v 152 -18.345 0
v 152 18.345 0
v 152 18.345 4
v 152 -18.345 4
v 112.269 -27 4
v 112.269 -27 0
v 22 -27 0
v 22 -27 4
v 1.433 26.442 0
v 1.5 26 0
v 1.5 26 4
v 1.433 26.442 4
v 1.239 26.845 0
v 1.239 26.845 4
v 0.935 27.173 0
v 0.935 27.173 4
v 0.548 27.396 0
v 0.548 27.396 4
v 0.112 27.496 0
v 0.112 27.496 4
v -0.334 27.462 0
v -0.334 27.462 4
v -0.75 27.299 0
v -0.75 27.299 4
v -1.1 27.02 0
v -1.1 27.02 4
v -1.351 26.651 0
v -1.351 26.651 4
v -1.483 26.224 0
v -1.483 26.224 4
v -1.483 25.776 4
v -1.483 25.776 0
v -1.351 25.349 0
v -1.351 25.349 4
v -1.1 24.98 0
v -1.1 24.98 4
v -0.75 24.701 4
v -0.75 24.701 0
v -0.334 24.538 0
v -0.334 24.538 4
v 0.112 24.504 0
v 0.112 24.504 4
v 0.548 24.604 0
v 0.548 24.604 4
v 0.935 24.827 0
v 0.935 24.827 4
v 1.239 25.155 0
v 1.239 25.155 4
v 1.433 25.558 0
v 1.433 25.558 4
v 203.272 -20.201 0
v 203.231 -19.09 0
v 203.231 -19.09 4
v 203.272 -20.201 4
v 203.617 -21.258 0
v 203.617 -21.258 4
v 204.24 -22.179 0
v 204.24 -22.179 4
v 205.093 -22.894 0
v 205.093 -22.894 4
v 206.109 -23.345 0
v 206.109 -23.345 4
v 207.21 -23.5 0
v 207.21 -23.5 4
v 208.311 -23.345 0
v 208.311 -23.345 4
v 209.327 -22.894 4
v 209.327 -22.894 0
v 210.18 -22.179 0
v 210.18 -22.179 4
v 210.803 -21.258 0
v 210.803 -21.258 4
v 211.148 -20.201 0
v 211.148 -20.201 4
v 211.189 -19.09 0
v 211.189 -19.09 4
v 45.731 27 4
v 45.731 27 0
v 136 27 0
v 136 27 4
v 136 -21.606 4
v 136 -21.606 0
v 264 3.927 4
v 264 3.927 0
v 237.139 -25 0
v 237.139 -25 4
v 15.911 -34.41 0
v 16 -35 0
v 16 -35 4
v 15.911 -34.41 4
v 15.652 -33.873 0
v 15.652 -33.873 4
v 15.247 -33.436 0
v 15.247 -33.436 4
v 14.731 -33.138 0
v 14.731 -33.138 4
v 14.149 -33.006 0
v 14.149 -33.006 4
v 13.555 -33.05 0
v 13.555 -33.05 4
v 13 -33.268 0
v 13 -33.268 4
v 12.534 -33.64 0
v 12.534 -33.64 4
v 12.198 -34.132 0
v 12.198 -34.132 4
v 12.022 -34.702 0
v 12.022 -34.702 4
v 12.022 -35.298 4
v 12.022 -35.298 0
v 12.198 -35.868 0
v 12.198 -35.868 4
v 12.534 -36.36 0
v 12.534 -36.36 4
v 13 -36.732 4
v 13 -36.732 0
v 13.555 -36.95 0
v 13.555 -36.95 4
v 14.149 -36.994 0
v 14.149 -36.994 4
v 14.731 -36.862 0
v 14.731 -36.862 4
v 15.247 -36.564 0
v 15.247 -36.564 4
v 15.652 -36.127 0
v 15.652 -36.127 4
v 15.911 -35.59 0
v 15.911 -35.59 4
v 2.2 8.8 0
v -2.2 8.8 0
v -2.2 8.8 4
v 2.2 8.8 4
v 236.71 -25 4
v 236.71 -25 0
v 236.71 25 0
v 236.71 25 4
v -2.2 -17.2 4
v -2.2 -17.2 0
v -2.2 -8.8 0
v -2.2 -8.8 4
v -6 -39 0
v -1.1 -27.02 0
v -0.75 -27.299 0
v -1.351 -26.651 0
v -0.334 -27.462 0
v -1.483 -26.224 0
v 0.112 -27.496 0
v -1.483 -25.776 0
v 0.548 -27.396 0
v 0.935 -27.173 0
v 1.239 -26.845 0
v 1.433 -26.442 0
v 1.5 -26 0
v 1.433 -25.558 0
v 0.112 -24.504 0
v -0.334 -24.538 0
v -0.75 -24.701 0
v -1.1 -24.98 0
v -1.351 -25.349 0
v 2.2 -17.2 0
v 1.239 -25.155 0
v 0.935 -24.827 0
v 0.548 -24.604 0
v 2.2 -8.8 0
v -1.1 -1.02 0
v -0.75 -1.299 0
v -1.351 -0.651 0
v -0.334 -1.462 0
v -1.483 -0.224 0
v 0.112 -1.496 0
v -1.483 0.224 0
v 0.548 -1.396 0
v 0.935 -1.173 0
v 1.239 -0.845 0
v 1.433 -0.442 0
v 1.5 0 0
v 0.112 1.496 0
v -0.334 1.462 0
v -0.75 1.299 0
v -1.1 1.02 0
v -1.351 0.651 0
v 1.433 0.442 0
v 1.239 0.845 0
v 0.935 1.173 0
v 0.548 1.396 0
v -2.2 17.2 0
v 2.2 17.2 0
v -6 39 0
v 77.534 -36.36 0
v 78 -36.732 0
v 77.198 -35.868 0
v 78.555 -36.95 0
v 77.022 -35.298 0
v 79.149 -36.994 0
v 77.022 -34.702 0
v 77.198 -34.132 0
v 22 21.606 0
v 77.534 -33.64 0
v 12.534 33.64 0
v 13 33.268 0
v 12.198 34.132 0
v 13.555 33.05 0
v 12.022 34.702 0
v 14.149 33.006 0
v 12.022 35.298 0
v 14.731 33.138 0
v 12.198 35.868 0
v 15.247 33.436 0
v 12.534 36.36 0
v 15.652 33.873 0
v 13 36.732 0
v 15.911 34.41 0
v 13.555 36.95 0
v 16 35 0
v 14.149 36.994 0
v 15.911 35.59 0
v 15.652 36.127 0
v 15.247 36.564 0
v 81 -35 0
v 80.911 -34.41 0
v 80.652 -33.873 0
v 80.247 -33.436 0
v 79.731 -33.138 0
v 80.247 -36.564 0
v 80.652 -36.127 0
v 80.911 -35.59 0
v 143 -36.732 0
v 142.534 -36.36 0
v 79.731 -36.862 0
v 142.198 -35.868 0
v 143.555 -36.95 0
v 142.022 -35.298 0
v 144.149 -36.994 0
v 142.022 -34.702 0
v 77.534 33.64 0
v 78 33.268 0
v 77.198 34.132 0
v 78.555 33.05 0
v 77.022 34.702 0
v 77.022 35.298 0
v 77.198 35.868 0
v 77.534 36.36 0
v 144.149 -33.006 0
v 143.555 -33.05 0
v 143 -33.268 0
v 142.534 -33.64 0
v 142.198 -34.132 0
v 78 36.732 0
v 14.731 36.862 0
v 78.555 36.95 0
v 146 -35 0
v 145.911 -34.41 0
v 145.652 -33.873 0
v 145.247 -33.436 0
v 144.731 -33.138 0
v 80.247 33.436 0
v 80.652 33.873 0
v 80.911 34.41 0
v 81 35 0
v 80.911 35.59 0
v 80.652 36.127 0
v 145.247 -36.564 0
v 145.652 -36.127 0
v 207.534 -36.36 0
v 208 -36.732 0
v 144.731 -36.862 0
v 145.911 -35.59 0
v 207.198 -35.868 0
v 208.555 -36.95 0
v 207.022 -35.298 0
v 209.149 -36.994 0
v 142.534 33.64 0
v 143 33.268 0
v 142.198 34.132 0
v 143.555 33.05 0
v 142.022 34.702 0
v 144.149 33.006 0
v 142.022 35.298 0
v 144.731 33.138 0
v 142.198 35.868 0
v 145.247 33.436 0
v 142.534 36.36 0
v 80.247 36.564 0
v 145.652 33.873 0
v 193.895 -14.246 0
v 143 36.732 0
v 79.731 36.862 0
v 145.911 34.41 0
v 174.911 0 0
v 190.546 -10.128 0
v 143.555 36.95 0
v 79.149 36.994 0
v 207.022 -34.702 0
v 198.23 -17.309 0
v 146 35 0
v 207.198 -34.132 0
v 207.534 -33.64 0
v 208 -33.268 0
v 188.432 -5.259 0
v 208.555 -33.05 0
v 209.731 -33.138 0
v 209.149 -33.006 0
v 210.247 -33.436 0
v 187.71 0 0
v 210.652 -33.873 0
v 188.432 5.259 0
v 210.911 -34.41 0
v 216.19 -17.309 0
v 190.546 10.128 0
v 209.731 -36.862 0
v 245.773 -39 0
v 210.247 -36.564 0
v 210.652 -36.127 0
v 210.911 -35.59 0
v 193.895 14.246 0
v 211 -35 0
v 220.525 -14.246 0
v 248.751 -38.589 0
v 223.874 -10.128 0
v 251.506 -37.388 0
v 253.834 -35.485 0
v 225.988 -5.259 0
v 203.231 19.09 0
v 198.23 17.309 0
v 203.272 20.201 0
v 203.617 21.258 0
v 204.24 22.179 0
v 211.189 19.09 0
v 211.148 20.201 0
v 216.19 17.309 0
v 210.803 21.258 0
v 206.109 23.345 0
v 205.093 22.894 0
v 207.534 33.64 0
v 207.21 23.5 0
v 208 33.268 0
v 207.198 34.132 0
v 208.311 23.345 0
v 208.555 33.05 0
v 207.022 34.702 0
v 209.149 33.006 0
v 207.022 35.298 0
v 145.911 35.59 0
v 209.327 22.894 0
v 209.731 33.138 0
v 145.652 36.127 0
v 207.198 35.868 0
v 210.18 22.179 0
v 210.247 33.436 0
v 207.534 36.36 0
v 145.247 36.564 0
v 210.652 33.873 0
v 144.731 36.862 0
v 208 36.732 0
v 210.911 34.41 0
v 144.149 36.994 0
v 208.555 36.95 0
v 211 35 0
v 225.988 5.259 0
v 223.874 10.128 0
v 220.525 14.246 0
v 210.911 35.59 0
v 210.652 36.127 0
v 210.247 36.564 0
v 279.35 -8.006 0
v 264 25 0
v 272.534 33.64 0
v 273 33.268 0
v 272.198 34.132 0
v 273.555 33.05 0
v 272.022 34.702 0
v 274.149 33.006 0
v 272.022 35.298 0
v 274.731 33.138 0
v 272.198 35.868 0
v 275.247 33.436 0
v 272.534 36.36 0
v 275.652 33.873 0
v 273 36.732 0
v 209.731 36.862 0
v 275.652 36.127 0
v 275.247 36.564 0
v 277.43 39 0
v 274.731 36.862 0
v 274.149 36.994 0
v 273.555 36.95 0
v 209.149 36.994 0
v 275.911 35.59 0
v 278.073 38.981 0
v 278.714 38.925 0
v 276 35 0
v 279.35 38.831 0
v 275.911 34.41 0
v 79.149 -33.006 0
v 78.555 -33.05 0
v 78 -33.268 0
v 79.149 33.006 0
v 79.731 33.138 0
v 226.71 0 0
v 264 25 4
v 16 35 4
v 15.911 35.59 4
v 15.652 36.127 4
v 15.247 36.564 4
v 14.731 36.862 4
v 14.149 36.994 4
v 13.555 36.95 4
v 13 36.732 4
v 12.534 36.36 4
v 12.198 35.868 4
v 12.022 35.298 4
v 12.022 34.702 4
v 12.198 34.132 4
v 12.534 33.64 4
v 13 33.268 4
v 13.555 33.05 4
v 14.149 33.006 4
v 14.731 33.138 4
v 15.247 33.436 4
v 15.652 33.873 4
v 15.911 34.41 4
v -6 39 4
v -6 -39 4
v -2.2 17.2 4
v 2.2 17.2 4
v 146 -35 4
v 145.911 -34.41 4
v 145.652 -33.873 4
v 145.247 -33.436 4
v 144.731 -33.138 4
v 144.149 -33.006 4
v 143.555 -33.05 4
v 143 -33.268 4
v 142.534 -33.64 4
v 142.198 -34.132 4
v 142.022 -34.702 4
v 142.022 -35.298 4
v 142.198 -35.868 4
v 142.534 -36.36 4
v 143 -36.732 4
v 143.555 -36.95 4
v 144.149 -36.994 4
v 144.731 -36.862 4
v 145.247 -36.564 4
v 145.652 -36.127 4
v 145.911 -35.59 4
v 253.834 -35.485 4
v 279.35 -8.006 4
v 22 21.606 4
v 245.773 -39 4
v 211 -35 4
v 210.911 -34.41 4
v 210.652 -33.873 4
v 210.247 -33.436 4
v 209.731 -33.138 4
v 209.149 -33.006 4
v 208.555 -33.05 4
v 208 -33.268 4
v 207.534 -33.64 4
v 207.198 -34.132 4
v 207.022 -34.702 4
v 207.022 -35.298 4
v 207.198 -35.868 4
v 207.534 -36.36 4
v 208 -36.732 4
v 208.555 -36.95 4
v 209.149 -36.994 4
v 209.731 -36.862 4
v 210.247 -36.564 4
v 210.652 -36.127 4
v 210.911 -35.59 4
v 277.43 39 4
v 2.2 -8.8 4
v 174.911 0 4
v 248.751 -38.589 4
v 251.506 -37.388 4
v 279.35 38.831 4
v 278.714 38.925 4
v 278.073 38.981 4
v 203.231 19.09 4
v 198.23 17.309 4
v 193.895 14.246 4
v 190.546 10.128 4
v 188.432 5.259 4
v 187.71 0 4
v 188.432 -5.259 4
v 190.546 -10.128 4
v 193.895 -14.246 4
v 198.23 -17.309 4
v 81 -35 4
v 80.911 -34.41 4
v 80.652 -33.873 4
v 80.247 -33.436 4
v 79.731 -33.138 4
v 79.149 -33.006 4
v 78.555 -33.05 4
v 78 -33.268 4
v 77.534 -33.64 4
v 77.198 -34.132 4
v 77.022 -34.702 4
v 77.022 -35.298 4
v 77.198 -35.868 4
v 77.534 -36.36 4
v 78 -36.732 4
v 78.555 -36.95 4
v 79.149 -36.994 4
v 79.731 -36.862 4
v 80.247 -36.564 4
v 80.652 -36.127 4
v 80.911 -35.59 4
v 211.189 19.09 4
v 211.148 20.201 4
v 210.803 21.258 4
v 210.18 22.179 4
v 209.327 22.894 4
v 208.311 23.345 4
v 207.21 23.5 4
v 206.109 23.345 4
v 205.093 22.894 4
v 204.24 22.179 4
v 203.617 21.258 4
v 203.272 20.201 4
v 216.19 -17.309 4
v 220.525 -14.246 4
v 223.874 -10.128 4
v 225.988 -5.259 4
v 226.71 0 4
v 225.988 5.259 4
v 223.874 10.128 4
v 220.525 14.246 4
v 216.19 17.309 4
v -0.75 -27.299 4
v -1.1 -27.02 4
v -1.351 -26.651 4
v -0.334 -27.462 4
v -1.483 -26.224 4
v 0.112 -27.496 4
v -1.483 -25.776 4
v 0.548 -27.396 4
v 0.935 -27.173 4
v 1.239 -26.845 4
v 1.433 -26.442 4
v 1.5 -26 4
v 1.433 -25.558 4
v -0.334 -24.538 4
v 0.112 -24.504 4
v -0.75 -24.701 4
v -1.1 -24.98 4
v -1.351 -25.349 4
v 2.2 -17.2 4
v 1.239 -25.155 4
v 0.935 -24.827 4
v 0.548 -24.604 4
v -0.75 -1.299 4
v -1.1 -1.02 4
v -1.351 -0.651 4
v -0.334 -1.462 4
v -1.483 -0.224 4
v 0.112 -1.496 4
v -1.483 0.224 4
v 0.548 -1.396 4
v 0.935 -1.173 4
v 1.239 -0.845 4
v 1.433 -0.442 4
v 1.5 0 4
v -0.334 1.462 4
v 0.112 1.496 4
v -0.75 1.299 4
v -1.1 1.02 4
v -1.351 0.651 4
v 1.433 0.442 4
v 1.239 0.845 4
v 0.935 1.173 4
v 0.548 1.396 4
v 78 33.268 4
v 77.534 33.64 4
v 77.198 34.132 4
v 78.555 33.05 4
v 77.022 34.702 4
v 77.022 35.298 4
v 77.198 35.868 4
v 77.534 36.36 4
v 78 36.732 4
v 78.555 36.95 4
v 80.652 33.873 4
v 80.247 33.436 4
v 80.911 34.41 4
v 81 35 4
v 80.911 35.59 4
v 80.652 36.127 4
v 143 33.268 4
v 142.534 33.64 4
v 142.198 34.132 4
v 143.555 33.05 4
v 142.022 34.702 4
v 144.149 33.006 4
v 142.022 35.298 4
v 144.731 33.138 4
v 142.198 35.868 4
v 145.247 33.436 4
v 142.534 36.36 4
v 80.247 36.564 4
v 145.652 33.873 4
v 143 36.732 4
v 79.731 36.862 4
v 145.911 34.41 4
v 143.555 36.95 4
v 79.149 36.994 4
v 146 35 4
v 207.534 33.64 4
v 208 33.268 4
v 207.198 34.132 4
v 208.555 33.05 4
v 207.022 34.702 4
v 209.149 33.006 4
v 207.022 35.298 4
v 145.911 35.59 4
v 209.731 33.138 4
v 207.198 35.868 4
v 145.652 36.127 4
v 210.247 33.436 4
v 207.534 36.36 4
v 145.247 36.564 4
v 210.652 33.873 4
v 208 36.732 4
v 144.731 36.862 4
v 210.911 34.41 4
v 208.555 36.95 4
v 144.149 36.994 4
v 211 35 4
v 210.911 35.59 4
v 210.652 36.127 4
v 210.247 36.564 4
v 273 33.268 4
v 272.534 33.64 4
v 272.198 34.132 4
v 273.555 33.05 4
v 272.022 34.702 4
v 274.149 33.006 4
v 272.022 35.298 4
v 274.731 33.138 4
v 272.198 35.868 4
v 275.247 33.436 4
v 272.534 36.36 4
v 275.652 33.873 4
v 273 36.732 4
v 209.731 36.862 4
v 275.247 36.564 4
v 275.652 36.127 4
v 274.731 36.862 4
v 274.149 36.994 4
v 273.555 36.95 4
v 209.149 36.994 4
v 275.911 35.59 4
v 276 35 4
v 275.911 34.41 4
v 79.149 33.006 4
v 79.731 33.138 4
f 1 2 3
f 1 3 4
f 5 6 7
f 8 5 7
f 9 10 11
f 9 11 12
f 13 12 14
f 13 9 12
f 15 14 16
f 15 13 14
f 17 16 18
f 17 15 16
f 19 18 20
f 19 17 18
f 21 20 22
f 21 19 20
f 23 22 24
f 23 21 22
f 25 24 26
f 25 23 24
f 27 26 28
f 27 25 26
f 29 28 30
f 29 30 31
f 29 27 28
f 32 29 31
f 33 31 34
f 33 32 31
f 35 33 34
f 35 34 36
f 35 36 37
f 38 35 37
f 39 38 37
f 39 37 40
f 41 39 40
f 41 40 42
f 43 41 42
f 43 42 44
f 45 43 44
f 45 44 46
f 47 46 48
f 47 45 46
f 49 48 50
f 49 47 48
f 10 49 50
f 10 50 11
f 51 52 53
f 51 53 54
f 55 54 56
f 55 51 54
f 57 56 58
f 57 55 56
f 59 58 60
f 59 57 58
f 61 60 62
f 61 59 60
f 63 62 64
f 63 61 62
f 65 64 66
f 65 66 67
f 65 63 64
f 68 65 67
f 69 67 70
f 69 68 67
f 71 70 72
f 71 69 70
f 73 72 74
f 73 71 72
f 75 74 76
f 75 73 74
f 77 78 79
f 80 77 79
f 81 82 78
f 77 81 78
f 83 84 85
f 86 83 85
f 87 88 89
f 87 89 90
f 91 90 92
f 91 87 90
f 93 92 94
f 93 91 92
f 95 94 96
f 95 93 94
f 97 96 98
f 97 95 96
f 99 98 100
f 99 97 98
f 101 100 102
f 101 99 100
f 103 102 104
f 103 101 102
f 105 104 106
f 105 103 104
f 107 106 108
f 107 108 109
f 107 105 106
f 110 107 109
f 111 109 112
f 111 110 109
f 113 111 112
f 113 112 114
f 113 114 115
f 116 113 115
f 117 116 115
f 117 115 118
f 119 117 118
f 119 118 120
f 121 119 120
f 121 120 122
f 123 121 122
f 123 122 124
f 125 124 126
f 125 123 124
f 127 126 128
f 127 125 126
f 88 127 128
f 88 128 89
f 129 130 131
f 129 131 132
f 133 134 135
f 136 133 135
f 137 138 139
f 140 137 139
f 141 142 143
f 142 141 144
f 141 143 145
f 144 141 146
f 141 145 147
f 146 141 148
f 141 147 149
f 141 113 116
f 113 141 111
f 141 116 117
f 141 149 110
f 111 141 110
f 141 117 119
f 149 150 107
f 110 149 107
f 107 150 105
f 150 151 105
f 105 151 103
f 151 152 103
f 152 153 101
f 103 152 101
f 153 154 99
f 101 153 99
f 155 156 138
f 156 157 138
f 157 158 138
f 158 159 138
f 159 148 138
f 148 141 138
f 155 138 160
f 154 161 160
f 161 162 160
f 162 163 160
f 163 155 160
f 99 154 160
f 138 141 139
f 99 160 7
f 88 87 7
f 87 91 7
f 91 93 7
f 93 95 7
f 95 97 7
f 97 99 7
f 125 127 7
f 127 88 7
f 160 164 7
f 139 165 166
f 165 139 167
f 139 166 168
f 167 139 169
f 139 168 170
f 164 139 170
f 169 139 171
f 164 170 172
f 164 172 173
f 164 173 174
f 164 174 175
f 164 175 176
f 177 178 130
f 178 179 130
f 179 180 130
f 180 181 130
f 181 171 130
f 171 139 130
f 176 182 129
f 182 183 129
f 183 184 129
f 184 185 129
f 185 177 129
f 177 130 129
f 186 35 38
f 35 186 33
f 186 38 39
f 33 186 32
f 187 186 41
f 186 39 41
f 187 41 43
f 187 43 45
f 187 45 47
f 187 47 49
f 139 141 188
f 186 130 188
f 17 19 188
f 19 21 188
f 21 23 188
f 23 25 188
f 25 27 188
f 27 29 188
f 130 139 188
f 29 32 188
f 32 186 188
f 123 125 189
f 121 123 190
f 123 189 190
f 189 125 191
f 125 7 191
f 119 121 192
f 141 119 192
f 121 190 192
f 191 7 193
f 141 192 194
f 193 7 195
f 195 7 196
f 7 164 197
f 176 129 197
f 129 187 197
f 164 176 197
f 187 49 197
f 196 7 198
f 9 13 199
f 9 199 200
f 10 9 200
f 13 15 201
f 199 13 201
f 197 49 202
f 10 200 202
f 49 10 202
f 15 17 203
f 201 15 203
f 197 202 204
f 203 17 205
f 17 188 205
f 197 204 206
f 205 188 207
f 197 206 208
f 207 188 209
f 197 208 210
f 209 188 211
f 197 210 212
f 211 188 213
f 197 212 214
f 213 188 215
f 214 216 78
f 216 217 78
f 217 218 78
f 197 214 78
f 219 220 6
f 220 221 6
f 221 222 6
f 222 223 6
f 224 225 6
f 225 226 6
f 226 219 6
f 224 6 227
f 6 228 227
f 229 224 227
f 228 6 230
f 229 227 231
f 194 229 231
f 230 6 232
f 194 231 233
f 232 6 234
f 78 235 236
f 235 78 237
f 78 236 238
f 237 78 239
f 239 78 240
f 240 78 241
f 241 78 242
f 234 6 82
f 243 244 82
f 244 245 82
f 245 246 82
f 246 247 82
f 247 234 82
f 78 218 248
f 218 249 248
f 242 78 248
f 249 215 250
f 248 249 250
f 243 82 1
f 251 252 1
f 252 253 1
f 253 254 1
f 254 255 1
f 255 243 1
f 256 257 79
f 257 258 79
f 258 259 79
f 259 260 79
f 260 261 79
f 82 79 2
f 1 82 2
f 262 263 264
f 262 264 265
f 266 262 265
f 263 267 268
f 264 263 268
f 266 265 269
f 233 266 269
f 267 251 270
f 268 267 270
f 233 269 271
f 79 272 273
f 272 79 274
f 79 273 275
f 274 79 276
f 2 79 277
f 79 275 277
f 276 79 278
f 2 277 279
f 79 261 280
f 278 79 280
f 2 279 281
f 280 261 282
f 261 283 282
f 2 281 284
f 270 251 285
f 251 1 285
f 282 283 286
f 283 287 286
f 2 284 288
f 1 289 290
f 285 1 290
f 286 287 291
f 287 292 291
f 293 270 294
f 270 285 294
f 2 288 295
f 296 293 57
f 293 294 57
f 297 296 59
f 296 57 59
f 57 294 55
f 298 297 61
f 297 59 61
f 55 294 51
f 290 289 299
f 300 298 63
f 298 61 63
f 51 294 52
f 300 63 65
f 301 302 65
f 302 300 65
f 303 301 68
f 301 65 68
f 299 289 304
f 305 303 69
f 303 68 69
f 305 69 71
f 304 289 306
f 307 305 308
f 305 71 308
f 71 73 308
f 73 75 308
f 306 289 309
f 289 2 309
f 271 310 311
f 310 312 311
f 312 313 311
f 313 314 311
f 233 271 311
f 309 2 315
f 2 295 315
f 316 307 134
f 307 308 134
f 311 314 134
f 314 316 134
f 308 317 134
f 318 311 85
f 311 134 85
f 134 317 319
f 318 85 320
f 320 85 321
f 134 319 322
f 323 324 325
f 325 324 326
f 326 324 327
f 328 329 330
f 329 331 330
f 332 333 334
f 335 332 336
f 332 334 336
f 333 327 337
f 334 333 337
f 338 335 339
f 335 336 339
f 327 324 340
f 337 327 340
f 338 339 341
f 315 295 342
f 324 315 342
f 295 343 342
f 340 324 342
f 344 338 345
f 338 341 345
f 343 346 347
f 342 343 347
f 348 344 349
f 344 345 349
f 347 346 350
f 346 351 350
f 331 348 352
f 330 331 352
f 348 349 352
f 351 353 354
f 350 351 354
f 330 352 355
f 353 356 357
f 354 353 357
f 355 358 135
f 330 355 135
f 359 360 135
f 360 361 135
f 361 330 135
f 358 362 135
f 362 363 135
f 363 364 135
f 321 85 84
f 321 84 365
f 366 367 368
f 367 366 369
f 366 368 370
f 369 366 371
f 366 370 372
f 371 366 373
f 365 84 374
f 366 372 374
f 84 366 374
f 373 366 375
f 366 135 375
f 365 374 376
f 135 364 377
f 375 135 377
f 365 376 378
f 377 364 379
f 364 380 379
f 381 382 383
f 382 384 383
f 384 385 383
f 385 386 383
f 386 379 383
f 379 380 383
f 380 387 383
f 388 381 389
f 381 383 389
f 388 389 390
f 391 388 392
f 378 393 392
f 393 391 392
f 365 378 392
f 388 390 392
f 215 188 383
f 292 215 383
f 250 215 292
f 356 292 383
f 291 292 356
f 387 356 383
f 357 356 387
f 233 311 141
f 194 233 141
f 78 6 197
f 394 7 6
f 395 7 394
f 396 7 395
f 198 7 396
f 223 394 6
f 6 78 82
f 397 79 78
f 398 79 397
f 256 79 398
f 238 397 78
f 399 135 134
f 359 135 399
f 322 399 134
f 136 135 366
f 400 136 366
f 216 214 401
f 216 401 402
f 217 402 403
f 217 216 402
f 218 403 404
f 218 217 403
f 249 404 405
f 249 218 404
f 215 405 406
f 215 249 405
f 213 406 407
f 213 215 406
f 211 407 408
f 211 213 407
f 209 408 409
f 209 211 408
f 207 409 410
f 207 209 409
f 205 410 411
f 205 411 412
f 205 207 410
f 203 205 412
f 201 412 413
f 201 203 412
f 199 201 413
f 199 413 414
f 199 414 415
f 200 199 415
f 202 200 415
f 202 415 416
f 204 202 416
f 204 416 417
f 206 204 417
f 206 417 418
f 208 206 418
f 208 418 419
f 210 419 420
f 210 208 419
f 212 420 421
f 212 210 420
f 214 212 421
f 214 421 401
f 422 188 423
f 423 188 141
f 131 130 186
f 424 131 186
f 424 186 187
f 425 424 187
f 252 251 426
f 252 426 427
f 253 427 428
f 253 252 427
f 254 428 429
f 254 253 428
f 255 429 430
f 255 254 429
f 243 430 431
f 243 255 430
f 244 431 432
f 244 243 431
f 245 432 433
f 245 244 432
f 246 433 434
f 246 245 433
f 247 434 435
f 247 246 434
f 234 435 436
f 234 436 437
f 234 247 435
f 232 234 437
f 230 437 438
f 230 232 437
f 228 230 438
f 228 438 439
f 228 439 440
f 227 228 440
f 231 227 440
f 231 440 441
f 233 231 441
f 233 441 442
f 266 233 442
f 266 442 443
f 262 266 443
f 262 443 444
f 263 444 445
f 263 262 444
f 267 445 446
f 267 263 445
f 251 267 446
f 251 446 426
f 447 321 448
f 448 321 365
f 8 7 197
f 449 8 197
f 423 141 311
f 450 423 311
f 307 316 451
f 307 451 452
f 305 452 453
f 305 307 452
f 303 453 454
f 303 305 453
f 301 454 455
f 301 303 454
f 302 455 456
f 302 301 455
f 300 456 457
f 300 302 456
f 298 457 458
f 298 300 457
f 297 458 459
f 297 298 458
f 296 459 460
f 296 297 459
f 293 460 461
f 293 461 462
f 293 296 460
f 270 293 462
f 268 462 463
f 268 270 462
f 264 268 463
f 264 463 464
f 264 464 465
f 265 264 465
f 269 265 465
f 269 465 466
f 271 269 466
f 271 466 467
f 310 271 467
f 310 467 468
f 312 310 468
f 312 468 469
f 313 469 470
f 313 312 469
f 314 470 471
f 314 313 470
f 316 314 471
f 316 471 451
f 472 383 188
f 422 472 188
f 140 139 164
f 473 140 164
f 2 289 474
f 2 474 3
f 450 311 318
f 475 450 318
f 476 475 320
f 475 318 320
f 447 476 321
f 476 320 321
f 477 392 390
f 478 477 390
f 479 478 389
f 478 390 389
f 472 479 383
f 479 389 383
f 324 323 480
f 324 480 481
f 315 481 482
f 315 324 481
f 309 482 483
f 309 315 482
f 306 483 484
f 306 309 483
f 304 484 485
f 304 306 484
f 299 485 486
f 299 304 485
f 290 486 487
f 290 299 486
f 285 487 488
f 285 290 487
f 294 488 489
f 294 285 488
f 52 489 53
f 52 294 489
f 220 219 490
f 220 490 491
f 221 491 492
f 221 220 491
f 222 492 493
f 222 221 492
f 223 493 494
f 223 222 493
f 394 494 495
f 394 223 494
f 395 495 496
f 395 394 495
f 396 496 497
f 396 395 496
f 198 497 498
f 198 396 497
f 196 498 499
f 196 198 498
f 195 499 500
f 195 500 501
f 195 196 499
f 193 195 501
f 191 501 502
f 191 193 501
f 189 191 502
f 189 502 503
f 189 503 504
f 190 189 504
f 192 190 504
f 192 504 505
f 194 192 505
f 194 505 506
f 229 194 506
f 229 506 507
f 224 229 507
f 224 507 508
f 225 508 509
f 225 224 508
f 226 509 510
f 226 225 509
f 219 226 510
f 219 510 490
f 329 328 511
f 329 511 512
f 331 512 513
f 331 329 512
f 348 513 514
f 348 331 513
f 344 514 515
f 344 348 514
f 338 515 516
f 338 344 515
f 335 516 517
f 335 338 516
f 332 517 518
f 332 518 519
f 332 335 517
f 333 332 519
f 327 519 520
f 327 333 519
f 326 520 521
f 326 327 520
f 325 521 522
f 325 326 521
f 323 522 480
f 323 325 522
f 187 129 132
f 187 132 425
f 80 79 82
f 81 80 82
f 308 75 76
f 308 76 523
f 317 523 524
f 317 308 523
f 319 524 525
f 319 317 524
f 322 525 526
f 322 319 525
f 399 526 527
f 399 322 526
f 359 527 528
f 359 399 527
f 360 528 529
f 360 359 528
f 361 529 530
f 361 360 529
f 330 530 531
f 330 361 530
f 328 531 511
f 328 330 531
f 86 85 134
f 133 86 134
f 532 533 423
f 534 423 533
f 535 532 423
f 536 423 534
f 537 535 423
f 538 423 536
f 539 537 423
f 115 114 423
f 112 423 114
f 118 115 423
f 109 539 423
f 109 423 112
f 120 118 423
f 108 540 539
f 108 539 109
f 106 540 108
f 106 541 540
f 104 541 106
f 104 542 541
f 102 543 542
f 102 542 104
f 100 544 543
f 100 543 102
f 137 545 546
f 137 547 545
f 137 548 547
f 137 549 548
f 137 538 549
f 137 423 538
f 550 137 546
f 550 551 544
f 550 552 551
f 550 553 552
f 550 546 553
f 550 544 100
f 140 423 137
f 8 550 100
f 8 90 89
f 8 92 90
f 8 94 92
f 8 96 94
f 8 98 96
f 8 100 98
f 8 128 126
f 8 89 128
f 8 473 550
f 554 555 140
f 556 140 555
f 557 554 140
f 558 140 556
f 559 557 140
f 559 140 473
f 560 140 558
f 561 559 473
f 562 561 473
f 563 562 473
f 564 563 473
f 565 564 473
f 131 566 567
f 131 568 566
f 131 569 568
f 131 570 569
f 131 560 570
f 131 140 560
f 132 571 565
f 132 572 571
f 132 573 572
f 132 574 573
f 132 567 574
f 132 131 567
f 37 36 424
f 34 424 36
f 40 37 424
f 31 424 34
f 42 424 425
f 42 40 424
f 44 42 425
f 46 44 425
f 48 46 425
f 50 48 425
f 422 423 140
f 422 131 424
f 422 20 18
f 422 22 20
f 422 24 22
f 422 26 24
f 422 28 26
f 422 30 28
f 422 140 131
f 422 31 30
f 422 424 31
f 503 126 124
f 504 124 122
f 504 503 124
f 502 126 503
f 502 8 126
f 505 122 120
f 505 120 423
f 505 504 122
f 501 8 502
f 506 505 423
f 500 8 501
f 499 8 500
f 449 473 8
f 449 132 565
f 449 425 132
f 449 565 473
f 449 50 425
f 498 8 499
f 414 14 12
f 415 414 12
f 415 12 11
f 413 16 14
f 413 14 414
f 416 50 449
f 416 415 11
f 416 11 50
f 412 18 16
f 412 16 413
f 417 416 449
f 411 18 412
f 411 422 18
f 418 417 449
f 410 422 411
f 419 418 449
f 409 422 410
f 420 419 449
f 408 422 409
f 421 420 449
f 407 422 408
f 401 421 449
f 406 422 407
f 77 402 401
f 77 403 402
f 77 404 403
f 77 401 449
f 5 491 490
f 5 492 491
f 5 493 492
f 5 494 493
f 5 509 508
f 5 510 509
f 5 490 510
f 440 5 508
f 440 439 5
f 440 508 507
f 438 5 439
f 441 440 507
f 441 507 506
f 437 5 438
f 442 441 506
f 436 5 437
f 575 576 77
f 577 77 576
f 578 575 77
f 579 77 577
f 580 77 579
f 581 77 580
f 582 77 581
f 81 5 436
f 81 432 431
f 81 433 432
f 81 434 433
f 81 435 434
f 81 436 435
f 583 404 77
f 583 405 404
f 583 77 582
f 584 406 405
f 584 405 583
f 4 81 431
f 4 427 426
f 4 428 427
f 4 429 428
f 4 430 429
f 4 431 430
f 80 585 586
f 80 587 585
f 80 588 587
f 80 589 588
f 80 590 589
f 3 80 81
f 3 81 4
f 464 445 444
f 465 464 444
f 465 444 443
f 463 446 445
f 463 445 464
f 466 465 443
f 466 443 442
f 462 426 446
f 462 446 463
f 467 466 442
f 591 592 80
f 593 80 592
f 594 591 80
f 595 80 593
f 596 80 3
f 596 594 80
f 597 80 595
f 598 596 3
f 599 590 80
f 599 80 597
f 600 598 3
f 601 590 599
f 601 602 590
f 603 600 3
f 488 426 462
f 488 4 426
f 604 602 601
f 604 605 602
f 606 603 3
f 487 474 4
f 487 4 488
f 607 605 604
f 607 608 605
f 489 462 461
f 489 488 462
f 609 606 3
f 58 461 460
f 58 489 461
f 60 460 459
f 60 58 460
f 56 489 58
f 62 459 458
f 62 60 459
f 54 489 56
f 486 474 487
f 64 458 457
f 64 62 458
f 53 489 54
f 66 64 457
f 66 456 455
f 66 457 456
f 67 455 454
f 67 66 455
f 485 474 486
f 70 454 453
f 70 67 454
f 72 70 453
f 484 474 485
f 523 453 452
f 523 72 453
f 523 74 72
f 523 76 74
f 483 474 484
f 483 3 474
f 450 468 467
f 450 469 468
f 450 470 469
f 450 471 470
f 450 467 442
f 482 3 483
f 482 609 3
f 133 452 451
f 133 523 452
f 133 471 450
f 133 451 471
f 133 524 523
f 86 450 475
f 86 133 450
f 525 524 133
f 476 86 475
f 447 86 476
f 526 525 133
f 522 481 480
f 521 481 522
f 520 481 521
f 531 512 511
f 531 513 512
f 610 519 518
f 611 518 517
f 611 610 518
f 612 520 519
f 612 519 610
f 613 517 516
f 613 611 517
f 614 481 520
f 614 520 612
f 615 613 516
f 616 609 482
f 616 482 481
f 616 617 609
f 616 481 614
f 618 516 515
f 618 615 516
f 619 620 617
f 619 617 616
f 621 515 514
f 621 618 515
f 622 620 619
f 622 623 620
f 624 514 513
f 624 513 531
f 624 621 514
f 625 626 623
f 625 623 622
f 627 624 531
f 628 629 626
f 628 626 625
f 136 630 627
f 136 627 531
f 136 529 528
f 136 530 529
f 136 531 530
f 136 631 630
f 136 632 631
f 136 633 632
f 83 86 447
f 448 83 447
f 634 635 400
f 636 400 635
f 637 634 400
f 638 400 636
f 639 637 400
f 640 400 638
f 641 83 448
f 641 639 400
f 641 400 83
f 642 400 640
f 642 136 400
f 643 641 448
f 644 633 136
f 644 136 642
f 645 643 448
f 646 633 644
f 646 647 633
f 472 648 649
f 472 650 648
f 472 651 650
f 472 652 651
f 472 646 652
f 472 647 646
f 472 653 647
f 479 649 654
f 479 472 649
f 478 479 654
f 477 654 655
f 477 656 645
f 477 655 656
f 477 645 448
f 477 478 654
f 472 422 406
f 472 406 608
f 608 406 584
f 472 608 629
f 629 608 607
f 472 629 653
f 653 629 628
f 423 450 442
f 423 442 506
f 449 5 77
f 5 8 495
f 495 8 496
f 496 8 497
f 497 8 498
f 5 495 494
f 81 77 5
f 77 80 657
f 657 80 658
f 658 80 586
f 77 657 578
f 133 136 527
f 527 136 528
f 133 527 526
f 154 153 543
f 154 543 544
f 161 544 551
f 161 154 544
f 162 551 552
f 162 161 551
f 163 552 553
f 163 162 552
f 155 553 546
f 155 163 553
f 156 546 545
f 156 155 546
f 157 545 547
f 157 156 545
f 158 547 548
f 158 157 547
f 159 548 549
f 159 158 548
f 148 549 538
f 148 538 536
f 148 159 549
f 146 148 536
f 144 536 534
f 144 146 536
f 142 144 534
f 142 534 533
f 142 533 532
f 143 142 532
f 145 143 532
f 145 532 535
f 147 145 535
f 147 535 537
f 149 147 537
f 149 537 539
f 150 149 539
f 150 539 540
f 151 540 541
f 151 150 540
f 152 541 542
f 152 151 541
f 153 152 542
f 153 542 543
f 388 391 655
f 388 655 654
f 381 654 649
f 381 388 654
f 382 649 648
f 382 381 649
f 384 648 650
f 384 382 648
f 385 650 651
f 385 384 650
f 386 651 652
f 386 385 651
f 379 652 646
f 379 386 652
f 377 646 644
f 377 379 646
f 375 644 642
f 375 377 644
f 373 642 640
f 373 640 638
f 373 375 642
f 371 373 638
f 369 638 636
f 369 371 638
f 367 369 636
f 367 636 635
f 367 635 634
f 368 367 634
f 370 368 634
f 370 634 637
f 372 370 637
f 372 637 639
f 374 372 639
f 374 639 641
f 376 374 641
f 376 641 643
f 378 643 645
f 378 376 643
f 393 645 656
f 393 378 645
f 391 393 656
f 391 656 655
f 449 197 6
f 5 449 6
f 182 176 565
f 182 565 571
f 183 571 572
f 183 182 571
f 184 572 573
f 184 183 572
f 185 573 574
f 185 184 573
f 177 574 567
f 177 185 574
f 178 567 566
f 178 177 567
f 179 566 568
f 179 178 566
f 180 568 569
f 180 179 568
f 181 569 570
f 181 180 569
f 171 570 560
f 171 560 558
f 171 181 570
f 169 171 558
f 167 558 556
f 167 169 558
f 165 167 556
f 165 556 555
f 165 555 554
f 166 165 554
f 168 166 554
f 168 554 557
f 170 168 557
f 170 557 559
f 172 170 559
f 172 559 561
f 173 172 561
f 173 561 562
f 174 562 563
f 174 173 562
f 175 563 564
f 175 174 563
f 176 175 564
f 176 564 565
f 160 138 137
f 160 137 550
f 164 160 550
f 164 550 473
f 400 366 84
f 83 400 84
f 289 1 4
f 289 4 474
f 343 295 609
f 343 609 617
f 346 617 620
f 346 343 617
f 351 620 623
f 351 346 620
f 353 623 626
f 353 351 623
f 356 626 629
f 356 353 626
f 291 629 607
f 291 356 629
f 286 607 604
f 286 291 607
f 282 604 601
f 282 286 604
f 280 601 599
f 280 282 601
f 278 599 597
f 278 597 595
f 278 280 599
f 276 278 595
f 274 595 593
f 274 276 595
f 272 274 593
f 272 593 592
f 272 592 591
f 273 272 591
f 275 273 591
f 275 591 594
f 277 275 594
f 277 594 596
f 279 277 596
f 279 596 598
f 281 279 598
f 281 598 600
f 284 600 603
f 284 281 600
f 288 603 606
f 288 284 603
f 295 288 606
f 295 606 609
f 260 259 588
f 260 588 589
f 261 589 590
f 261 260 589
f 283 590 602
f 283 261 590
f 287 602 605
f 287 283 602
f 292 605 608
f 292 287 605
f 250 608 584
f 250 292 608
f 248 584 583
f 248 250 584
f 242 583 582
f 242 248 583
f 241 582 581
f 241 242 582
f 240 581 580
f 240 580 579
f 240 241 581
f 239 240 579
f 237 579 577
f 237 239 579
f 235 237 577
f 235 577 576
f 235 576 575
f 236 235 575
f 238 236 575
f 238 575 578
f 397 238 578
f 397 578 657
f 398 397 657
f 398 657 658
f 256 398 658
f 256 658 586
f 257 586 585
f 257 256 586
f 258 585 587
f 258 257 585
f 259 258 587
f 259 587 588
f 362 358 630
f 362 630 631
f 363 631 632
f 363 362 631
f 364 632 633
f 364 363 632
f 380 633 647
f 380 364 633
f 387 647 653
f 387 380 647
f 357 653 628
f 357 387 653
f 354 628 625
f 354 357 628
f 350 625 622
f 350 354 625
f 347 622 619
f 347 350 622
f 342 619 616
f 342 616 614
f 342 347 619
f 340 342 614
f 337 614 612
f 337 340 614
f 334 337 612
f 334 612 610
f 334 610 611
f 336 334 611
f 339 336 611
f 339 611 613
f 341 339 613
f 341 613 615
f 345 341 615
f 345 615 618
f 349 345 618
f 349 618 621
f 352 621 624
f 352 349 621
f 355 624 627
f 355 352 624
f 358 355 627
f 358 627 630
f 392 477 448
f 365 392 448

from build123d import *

# Parameters (mm, degrees)
SKETCH_1_R          = 1.5
SKETCH_1_R_2        = 2
SKETCH_1_W          = 4.4
SKETCH_1_H          = 8.4
EXTRUDE_1_DEPTH     = 4
CUT_EXTRUDE_1_DEPTH = 10


with BuildPart() as part:
    # 草图1 → 凸台-拉伸1 (new body)
    with BuildSketch(Plane.XY):
        with BuildLine():
            Line((-6, 39), (-6, -39))
            Line((-6, -39), (245.772887801, -39))
            ThreePointArc((245.772887801, -39), (250.169785399, -38.08301996), (253.833616208, -35.484962093))
            Line((253.833616208, -35.484962093), (285.490974876, -1.392421989))
            ThreePointArc((285.490974876, -1.392421989), (287.669094365, 2.071844423), (288.430246468, 6.092540104))
            Line((288.430246468, 6.092540104), (288.430246468, 28))
            ThreePointArc((288.430246468, 28), (285.208421061, 35.778174593), (277.430246468, 39))
            Line((277.430246468, 39), (-6, 39))
        make_face()
        Circle(SKETCH_1_R, mode=Mode.SUBTRACT)
        with Locations((0, 26)):
            Circle(SKETCH_1_R, mode=Mode.SUBTRACT)
        with Locations((0, -26)):
            Circle(SKETCH_1_R, mode=Mode.SUBTRACT)
        with Locations((274, 35)):
            Circle(SKETCH_1_R_2, mode=Mode.SUBTRACT)
        with Locations((209, 35)):
            Circle(SKETCH_1_R_2, mode=Mode.SUBTRACT)
        with Locations((144, 35)):
            Circle(SKETCH_1_R_2, mode=Mode.SUBTRACT)
        with Locations((79, 35)):
            Circle(SKETCH_1_R_2, mode=Mode.SUBTRACT)
        with Locations((14, 35)):
            Circle(SKETCH_1_R_2, mode=Mode.SUBTRACT)
        with Locations((209, -35)):
            Circle(SKETCH_1_R_2, mode=Mode.SUBTRACT)
        with Locations((144, -35)):
            Circle(SKETCH_1_R_2, mode=Mode.SUBTRACT)
        with Locations((79, -35)):
            Circle(SKETCH_1_R_2, mode=Mode.SUBTRACT)
        with Locations((14, -35)):
            Circle(SKETCH_1_R_2, mode=Mode.SUBTRACT)
        with Locations((0, 13)):
            Rectangle(SKETCH_1_W, SKETCH_1_H, mode=Mode.SUBTRACT)
        with Locations((0, -13)):
            Rectangle(SKETCH_1_W, SKETCH_1_H, mode=Mode.SUBTRACT)
        Polygon((112.268773645, -27), (22, -27), (22, 21.606262732), align=None, mode=Mode.SUBTRACT)
        Polygon((45.731226355, 27), (136, 27), (136, -21.606262732), align=None, mode=Mode.SUBTRACT)
        Polygon((152, 18.345484713), (152, -18.345484713), (174.910889623, 0), align=None, mode=Mode.SUBTRACT)
        Polygon((236.71, -25), (236.71, 25), (264, 25), (264, 3.926902442), (237.139304875, -25), align=None, mode=Mode.SUBTRACT)
        with BuildLine():
            ThreePointArc((203.231094412, 19.08974359), (187.71, 0), (203.231094412, -19.08974359))
            ThreePointArc((203.231094412, -19.08974359), (207.21, -23.5), (211.188905588, -19.08974359))
            ThreePointArc((211.188905588, -19.08974359), (226.71, 0), (211.188905588, 19.08974359))
            ThreePointArc((211.188905588, 19.08974359), (207.21, 23.5), (203.231094412, 19.08974359))
        make_face(mode=Mode.SUBTRACT)
    extrude(amount=EXTRUDE_1_DEPTH)

    # 草图2 → 切除-拉伸1 (cut)
    with BuildSketch(Plane.XY.offset(4)):
        Polygon((279.349775131, 38.831223833), (279.349775131, -8.006021715), (315.852962883, -9.139766663), (310.030210466, 44.302513286), align=None)
    extrude(amount=-CUT_EXTRUDE_1_DEPTH, mode=Mode.SUBTRACT)


solid = part.part
